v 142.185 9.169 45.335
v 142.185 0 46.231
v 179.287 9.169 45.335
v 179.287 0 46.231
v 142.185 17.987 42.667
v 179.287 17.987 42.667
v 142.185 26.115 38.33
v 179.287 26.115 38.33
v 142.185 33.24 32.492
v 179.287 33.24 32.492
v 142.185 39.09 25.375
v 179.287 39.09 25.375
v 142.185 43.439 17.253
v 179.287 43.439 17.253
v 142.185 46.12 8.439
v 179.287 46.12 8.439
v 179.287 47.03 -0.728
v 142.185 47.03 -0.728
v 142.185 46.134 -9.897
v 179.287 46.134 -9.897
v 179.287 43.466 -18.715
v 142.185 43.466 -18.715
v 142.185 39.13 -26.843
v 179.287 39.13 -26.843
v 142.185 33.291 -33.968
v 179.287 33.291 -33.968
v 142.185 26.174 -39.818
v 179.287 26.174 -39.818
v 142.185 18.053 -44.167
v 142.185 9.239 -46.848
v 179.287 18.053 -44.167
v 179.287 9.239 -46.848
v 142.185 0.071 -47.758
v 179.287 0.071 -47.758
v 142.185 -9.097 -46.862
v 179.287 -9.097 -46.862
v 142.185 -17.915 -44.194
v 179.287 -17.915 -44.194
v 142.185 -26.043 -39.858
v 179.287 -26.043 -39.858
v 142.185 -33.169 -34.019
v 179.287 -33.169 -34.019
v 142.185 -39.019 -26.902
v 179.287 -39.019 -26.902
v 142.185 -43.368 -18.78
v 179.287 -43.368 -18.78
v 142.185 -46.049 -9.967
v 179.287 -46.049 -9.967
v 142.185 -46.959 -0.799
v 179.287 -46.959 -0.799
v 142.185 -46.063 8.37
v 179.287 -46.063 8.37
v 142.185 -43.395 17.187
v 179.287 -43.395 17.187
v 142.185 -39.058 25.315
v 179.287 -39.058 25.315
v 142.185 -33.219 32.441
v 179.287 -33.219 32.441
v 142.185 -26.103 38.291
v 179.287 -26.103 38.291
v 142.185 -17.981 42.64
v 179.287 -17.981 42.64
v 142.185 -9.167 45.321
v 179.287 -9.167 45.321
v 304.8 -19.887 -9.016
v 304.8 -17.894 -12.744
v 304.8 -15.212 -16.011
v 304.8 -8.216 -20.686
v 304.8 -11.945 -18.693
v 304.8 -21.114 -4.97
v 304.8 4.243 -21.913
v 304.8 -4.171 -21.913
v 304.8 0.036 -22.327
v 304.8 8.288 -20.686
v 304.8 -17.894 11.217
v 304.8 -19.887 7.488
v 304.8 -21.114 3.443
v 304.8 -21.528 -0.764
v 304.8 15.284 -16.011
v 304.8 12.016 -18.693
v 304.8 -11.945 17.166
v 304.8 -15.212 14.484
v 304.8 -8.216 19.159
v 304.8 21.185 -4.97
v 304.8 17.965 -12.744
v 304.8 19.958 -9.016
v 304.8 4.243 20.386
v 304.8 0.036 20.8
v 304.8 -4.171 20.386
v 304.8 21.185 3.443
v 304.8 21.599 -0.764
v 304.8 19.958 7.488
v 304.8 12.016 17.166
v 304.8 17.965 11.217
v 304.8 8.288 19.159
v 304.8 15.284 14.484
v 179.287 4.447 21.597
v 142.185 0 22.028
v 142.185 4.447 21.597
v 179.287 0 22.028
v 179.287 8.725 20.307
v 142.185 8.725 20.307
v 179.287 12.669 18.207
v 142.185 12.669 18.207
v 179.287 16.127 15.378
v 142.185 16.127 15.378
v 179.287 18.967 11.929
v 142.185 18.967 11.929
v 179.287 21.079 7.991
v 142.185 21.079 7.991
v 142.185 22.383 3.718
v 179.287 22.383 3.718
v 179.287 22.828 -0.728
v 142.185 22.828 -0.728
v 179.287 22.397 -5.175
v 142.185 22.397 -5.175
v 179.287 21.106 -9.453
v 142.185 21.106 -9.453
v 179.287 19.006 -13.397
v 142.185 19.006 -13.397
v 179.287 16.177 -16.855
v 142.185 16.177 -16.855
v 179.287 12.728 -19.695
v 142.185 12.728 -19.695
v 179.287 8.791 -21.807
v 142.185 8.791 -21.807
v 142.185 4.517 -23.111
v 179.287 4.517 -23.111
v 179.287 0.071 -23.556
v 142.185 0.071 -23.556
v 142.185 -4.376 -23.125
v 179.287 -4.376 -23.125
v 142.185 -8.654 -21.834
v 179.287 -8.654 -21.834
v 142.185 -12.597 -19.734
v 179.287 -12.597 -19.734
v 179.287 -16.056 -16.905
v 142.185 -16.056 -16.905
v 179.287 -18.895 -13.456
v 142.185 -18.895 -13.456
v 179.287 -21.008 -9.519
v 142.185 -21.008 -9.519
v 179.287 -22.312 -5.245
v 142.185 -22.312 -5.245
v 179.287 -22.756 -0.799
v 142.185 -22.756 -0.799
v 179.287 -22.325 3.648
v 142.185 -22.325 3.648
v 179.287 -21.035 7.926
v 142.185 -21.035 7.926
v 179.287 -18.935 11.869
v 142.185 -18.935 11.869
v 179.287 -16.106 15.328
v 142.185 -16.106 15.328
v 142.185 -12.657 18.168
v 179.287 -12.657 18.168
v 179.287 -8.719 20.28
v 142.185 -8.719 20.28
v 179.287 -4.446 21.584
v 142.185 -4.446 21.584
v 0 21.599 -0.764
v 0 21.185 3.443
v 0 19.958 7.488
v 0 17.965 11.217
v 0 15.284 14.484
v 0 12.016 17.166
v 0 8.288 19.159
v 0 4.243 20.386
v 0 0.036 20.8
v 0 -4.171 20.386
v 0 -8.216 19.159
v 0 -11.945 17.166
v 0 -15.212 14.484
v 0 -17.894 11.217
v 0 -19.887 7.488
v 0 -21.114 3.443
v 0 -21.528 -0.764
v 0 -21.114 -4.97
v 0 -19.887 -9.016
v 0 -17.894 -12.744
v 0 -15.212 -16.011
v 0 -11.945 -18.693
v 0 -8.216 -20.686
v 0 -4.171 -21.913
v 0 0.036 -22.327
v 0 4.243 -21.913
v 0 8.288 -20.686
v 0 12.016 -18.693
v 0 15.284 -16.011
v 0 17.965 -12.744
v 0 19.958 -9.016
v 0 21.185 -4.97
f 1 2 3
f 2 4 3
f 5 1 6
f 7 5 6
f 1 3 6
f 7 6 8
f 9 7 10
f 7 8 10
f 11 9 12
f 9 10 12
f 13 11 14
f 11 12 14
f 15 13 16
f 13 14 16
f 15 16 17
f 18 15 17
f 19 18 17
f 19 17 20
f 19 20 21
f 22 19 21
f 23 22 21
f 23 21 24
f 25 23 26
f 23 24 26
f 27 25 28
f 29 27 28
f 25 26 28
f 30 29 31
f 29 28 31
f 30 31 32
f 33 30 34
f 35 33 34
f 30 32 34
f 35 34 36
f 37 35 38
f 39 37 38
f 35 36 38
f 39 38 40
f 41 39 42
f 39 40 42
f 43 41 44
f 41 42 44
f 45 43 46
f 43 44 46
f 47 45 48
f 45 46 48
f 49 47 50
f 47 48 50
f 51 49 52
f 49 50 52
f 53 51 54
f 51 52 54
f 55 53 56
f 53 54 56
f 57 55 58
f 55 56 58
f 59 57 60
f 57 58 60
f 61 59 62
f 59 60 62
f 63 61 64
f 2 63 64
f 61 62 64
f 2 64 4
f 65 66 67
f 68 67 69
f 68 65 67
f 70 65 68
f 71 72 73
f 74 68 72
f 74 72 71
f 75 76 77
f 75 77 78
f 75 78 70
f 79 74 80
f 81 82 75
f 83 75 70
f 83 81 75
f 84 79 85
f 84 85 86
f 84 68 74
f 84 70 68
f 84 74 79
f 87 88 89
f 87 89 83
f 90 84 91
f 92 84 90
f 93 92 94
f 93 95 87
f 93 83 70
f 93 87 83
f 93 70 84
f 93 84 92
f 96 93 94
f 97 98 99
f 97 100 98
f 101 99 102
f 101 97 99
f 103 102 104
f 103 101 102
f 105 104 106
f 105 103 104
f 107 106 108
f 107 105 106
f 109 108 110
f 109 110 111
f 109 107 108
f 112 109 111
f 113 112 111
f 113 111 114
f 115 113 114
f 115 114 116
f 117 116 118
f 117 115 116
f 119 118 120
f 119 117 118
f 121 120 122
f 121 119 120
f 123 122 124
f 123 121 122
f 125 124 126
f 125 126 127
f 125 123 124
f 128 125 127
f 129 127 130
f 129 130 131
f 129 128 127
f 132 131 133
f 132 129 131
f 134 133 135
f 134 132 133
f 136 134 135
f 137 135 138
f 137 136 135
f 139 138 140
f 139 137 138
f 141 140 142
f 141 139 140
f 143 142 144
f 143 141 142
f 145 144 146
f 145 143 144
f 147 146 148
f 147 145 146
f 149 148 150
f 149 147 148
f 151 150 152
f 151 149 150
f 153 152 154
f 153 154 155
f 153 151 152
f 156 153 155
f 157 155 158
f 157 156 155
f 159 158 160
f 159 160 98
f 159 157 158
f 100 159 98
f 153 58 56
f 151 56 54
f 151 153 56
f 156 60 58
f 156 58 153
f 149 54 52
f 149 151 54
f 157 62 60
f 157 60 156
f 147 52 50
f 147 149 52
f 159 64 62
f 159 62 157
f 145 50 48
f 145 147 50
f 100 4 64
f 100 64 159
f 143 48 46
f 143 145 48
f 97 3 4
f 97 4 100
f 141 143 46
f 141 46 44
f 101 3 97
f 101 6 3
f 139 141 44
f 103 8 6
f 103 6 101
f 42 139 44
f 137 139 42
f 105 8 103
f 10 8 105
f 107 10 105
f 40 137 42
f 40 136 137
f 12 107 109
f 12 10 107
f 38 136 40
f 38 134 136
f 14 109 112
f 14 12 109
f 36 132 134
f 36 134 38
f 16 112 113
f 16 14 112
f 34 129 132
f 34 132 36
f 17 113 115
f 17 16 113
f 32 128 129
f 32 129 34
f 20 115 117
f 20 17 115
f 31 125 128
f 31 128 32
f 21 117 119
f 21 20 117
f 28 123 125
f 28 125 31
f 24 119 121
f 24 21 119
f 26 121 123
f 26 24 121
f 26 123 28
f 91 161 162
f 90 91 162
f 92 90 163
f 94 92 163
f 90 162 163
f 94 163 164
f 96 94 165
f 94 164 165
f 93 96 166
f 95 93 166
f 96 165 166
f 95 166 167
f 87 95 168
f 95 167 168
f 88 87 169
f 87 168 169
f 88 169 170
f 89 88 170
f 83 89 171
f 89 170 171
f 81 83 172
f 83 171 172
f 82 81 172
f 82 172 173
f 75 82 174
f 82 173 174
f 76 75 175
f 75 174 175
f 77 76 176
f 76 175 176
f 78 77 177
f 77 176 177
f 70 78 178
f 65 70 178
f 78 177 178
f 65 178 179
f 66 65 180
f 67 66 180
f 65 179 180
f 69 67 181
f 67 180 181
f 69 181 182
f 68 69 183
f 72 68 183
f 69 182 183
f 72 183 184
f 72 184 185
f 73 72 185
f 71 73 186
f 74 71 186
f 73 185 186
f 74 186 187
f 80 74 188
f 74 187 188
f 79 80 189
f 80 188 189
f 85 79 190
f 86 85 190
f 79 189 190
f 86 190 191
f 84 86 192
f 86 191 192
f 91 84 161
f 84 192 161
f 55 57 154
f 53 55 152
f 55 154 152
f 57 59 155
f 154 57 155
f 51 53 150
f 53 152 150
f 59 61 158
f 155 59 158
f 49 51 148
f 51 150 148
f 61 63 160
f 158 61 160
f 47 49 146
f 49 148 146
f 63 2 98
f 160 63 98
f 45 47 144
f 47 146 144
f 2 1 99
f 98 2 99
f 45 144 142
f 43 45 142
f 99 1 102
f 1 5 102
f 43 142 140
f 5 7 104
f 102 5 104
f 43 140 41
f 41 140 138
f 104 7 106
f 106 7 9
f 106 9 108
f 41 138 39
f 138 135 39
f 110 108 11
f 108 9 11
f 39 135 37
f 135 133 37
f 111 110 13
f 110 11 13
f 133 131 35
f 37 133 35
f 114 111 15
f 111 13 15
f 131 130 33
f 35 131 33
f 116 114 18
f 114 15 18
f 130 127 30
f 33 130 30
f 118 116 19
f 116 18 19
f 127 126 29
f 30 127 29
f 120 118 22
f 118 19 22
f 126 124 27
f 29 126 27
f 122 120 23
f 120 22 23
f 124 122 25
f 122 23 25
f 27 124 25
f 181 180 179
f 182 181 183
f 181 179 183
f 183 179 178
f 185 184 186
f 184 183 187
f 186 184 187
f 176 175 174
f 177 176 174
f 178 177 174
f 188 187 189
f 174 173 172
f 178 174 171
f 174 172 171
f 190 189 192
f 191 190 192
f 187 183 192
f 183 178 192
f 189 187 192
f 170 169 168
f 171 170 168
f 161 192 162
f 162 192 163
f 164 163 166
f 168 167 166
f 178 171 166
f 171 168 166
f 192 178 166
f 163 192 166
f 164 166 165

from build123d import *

# Parameters (mm, degrees)
F0_R     = 21.563758
F1_DEPTH = 304.8
F2_W     = 37.101716
F2_H     = 24.202138


with BuildPart() as f1:
    # F0 (on Right) → F1 (new body)
    with BuildSketch(Plane.YZ):
        with Locations((0.035658, -0.763595)):
            Circle(F0_R)
    extrude(amount=F1_DEPTH)


with BuildPart() as f3:
    # F2 (on Front) → F3 (revolve)
    with BuildSketch(Plane.XZ):
        with Locations((160.736278, 34.129545)):
            Rectangle(F2_W, F2_H)
    revolve(axis=Axis((0, 0.035658, -0.763595), (-1, 0, 0)))


solid = Compound([f1.part, f3.part])
